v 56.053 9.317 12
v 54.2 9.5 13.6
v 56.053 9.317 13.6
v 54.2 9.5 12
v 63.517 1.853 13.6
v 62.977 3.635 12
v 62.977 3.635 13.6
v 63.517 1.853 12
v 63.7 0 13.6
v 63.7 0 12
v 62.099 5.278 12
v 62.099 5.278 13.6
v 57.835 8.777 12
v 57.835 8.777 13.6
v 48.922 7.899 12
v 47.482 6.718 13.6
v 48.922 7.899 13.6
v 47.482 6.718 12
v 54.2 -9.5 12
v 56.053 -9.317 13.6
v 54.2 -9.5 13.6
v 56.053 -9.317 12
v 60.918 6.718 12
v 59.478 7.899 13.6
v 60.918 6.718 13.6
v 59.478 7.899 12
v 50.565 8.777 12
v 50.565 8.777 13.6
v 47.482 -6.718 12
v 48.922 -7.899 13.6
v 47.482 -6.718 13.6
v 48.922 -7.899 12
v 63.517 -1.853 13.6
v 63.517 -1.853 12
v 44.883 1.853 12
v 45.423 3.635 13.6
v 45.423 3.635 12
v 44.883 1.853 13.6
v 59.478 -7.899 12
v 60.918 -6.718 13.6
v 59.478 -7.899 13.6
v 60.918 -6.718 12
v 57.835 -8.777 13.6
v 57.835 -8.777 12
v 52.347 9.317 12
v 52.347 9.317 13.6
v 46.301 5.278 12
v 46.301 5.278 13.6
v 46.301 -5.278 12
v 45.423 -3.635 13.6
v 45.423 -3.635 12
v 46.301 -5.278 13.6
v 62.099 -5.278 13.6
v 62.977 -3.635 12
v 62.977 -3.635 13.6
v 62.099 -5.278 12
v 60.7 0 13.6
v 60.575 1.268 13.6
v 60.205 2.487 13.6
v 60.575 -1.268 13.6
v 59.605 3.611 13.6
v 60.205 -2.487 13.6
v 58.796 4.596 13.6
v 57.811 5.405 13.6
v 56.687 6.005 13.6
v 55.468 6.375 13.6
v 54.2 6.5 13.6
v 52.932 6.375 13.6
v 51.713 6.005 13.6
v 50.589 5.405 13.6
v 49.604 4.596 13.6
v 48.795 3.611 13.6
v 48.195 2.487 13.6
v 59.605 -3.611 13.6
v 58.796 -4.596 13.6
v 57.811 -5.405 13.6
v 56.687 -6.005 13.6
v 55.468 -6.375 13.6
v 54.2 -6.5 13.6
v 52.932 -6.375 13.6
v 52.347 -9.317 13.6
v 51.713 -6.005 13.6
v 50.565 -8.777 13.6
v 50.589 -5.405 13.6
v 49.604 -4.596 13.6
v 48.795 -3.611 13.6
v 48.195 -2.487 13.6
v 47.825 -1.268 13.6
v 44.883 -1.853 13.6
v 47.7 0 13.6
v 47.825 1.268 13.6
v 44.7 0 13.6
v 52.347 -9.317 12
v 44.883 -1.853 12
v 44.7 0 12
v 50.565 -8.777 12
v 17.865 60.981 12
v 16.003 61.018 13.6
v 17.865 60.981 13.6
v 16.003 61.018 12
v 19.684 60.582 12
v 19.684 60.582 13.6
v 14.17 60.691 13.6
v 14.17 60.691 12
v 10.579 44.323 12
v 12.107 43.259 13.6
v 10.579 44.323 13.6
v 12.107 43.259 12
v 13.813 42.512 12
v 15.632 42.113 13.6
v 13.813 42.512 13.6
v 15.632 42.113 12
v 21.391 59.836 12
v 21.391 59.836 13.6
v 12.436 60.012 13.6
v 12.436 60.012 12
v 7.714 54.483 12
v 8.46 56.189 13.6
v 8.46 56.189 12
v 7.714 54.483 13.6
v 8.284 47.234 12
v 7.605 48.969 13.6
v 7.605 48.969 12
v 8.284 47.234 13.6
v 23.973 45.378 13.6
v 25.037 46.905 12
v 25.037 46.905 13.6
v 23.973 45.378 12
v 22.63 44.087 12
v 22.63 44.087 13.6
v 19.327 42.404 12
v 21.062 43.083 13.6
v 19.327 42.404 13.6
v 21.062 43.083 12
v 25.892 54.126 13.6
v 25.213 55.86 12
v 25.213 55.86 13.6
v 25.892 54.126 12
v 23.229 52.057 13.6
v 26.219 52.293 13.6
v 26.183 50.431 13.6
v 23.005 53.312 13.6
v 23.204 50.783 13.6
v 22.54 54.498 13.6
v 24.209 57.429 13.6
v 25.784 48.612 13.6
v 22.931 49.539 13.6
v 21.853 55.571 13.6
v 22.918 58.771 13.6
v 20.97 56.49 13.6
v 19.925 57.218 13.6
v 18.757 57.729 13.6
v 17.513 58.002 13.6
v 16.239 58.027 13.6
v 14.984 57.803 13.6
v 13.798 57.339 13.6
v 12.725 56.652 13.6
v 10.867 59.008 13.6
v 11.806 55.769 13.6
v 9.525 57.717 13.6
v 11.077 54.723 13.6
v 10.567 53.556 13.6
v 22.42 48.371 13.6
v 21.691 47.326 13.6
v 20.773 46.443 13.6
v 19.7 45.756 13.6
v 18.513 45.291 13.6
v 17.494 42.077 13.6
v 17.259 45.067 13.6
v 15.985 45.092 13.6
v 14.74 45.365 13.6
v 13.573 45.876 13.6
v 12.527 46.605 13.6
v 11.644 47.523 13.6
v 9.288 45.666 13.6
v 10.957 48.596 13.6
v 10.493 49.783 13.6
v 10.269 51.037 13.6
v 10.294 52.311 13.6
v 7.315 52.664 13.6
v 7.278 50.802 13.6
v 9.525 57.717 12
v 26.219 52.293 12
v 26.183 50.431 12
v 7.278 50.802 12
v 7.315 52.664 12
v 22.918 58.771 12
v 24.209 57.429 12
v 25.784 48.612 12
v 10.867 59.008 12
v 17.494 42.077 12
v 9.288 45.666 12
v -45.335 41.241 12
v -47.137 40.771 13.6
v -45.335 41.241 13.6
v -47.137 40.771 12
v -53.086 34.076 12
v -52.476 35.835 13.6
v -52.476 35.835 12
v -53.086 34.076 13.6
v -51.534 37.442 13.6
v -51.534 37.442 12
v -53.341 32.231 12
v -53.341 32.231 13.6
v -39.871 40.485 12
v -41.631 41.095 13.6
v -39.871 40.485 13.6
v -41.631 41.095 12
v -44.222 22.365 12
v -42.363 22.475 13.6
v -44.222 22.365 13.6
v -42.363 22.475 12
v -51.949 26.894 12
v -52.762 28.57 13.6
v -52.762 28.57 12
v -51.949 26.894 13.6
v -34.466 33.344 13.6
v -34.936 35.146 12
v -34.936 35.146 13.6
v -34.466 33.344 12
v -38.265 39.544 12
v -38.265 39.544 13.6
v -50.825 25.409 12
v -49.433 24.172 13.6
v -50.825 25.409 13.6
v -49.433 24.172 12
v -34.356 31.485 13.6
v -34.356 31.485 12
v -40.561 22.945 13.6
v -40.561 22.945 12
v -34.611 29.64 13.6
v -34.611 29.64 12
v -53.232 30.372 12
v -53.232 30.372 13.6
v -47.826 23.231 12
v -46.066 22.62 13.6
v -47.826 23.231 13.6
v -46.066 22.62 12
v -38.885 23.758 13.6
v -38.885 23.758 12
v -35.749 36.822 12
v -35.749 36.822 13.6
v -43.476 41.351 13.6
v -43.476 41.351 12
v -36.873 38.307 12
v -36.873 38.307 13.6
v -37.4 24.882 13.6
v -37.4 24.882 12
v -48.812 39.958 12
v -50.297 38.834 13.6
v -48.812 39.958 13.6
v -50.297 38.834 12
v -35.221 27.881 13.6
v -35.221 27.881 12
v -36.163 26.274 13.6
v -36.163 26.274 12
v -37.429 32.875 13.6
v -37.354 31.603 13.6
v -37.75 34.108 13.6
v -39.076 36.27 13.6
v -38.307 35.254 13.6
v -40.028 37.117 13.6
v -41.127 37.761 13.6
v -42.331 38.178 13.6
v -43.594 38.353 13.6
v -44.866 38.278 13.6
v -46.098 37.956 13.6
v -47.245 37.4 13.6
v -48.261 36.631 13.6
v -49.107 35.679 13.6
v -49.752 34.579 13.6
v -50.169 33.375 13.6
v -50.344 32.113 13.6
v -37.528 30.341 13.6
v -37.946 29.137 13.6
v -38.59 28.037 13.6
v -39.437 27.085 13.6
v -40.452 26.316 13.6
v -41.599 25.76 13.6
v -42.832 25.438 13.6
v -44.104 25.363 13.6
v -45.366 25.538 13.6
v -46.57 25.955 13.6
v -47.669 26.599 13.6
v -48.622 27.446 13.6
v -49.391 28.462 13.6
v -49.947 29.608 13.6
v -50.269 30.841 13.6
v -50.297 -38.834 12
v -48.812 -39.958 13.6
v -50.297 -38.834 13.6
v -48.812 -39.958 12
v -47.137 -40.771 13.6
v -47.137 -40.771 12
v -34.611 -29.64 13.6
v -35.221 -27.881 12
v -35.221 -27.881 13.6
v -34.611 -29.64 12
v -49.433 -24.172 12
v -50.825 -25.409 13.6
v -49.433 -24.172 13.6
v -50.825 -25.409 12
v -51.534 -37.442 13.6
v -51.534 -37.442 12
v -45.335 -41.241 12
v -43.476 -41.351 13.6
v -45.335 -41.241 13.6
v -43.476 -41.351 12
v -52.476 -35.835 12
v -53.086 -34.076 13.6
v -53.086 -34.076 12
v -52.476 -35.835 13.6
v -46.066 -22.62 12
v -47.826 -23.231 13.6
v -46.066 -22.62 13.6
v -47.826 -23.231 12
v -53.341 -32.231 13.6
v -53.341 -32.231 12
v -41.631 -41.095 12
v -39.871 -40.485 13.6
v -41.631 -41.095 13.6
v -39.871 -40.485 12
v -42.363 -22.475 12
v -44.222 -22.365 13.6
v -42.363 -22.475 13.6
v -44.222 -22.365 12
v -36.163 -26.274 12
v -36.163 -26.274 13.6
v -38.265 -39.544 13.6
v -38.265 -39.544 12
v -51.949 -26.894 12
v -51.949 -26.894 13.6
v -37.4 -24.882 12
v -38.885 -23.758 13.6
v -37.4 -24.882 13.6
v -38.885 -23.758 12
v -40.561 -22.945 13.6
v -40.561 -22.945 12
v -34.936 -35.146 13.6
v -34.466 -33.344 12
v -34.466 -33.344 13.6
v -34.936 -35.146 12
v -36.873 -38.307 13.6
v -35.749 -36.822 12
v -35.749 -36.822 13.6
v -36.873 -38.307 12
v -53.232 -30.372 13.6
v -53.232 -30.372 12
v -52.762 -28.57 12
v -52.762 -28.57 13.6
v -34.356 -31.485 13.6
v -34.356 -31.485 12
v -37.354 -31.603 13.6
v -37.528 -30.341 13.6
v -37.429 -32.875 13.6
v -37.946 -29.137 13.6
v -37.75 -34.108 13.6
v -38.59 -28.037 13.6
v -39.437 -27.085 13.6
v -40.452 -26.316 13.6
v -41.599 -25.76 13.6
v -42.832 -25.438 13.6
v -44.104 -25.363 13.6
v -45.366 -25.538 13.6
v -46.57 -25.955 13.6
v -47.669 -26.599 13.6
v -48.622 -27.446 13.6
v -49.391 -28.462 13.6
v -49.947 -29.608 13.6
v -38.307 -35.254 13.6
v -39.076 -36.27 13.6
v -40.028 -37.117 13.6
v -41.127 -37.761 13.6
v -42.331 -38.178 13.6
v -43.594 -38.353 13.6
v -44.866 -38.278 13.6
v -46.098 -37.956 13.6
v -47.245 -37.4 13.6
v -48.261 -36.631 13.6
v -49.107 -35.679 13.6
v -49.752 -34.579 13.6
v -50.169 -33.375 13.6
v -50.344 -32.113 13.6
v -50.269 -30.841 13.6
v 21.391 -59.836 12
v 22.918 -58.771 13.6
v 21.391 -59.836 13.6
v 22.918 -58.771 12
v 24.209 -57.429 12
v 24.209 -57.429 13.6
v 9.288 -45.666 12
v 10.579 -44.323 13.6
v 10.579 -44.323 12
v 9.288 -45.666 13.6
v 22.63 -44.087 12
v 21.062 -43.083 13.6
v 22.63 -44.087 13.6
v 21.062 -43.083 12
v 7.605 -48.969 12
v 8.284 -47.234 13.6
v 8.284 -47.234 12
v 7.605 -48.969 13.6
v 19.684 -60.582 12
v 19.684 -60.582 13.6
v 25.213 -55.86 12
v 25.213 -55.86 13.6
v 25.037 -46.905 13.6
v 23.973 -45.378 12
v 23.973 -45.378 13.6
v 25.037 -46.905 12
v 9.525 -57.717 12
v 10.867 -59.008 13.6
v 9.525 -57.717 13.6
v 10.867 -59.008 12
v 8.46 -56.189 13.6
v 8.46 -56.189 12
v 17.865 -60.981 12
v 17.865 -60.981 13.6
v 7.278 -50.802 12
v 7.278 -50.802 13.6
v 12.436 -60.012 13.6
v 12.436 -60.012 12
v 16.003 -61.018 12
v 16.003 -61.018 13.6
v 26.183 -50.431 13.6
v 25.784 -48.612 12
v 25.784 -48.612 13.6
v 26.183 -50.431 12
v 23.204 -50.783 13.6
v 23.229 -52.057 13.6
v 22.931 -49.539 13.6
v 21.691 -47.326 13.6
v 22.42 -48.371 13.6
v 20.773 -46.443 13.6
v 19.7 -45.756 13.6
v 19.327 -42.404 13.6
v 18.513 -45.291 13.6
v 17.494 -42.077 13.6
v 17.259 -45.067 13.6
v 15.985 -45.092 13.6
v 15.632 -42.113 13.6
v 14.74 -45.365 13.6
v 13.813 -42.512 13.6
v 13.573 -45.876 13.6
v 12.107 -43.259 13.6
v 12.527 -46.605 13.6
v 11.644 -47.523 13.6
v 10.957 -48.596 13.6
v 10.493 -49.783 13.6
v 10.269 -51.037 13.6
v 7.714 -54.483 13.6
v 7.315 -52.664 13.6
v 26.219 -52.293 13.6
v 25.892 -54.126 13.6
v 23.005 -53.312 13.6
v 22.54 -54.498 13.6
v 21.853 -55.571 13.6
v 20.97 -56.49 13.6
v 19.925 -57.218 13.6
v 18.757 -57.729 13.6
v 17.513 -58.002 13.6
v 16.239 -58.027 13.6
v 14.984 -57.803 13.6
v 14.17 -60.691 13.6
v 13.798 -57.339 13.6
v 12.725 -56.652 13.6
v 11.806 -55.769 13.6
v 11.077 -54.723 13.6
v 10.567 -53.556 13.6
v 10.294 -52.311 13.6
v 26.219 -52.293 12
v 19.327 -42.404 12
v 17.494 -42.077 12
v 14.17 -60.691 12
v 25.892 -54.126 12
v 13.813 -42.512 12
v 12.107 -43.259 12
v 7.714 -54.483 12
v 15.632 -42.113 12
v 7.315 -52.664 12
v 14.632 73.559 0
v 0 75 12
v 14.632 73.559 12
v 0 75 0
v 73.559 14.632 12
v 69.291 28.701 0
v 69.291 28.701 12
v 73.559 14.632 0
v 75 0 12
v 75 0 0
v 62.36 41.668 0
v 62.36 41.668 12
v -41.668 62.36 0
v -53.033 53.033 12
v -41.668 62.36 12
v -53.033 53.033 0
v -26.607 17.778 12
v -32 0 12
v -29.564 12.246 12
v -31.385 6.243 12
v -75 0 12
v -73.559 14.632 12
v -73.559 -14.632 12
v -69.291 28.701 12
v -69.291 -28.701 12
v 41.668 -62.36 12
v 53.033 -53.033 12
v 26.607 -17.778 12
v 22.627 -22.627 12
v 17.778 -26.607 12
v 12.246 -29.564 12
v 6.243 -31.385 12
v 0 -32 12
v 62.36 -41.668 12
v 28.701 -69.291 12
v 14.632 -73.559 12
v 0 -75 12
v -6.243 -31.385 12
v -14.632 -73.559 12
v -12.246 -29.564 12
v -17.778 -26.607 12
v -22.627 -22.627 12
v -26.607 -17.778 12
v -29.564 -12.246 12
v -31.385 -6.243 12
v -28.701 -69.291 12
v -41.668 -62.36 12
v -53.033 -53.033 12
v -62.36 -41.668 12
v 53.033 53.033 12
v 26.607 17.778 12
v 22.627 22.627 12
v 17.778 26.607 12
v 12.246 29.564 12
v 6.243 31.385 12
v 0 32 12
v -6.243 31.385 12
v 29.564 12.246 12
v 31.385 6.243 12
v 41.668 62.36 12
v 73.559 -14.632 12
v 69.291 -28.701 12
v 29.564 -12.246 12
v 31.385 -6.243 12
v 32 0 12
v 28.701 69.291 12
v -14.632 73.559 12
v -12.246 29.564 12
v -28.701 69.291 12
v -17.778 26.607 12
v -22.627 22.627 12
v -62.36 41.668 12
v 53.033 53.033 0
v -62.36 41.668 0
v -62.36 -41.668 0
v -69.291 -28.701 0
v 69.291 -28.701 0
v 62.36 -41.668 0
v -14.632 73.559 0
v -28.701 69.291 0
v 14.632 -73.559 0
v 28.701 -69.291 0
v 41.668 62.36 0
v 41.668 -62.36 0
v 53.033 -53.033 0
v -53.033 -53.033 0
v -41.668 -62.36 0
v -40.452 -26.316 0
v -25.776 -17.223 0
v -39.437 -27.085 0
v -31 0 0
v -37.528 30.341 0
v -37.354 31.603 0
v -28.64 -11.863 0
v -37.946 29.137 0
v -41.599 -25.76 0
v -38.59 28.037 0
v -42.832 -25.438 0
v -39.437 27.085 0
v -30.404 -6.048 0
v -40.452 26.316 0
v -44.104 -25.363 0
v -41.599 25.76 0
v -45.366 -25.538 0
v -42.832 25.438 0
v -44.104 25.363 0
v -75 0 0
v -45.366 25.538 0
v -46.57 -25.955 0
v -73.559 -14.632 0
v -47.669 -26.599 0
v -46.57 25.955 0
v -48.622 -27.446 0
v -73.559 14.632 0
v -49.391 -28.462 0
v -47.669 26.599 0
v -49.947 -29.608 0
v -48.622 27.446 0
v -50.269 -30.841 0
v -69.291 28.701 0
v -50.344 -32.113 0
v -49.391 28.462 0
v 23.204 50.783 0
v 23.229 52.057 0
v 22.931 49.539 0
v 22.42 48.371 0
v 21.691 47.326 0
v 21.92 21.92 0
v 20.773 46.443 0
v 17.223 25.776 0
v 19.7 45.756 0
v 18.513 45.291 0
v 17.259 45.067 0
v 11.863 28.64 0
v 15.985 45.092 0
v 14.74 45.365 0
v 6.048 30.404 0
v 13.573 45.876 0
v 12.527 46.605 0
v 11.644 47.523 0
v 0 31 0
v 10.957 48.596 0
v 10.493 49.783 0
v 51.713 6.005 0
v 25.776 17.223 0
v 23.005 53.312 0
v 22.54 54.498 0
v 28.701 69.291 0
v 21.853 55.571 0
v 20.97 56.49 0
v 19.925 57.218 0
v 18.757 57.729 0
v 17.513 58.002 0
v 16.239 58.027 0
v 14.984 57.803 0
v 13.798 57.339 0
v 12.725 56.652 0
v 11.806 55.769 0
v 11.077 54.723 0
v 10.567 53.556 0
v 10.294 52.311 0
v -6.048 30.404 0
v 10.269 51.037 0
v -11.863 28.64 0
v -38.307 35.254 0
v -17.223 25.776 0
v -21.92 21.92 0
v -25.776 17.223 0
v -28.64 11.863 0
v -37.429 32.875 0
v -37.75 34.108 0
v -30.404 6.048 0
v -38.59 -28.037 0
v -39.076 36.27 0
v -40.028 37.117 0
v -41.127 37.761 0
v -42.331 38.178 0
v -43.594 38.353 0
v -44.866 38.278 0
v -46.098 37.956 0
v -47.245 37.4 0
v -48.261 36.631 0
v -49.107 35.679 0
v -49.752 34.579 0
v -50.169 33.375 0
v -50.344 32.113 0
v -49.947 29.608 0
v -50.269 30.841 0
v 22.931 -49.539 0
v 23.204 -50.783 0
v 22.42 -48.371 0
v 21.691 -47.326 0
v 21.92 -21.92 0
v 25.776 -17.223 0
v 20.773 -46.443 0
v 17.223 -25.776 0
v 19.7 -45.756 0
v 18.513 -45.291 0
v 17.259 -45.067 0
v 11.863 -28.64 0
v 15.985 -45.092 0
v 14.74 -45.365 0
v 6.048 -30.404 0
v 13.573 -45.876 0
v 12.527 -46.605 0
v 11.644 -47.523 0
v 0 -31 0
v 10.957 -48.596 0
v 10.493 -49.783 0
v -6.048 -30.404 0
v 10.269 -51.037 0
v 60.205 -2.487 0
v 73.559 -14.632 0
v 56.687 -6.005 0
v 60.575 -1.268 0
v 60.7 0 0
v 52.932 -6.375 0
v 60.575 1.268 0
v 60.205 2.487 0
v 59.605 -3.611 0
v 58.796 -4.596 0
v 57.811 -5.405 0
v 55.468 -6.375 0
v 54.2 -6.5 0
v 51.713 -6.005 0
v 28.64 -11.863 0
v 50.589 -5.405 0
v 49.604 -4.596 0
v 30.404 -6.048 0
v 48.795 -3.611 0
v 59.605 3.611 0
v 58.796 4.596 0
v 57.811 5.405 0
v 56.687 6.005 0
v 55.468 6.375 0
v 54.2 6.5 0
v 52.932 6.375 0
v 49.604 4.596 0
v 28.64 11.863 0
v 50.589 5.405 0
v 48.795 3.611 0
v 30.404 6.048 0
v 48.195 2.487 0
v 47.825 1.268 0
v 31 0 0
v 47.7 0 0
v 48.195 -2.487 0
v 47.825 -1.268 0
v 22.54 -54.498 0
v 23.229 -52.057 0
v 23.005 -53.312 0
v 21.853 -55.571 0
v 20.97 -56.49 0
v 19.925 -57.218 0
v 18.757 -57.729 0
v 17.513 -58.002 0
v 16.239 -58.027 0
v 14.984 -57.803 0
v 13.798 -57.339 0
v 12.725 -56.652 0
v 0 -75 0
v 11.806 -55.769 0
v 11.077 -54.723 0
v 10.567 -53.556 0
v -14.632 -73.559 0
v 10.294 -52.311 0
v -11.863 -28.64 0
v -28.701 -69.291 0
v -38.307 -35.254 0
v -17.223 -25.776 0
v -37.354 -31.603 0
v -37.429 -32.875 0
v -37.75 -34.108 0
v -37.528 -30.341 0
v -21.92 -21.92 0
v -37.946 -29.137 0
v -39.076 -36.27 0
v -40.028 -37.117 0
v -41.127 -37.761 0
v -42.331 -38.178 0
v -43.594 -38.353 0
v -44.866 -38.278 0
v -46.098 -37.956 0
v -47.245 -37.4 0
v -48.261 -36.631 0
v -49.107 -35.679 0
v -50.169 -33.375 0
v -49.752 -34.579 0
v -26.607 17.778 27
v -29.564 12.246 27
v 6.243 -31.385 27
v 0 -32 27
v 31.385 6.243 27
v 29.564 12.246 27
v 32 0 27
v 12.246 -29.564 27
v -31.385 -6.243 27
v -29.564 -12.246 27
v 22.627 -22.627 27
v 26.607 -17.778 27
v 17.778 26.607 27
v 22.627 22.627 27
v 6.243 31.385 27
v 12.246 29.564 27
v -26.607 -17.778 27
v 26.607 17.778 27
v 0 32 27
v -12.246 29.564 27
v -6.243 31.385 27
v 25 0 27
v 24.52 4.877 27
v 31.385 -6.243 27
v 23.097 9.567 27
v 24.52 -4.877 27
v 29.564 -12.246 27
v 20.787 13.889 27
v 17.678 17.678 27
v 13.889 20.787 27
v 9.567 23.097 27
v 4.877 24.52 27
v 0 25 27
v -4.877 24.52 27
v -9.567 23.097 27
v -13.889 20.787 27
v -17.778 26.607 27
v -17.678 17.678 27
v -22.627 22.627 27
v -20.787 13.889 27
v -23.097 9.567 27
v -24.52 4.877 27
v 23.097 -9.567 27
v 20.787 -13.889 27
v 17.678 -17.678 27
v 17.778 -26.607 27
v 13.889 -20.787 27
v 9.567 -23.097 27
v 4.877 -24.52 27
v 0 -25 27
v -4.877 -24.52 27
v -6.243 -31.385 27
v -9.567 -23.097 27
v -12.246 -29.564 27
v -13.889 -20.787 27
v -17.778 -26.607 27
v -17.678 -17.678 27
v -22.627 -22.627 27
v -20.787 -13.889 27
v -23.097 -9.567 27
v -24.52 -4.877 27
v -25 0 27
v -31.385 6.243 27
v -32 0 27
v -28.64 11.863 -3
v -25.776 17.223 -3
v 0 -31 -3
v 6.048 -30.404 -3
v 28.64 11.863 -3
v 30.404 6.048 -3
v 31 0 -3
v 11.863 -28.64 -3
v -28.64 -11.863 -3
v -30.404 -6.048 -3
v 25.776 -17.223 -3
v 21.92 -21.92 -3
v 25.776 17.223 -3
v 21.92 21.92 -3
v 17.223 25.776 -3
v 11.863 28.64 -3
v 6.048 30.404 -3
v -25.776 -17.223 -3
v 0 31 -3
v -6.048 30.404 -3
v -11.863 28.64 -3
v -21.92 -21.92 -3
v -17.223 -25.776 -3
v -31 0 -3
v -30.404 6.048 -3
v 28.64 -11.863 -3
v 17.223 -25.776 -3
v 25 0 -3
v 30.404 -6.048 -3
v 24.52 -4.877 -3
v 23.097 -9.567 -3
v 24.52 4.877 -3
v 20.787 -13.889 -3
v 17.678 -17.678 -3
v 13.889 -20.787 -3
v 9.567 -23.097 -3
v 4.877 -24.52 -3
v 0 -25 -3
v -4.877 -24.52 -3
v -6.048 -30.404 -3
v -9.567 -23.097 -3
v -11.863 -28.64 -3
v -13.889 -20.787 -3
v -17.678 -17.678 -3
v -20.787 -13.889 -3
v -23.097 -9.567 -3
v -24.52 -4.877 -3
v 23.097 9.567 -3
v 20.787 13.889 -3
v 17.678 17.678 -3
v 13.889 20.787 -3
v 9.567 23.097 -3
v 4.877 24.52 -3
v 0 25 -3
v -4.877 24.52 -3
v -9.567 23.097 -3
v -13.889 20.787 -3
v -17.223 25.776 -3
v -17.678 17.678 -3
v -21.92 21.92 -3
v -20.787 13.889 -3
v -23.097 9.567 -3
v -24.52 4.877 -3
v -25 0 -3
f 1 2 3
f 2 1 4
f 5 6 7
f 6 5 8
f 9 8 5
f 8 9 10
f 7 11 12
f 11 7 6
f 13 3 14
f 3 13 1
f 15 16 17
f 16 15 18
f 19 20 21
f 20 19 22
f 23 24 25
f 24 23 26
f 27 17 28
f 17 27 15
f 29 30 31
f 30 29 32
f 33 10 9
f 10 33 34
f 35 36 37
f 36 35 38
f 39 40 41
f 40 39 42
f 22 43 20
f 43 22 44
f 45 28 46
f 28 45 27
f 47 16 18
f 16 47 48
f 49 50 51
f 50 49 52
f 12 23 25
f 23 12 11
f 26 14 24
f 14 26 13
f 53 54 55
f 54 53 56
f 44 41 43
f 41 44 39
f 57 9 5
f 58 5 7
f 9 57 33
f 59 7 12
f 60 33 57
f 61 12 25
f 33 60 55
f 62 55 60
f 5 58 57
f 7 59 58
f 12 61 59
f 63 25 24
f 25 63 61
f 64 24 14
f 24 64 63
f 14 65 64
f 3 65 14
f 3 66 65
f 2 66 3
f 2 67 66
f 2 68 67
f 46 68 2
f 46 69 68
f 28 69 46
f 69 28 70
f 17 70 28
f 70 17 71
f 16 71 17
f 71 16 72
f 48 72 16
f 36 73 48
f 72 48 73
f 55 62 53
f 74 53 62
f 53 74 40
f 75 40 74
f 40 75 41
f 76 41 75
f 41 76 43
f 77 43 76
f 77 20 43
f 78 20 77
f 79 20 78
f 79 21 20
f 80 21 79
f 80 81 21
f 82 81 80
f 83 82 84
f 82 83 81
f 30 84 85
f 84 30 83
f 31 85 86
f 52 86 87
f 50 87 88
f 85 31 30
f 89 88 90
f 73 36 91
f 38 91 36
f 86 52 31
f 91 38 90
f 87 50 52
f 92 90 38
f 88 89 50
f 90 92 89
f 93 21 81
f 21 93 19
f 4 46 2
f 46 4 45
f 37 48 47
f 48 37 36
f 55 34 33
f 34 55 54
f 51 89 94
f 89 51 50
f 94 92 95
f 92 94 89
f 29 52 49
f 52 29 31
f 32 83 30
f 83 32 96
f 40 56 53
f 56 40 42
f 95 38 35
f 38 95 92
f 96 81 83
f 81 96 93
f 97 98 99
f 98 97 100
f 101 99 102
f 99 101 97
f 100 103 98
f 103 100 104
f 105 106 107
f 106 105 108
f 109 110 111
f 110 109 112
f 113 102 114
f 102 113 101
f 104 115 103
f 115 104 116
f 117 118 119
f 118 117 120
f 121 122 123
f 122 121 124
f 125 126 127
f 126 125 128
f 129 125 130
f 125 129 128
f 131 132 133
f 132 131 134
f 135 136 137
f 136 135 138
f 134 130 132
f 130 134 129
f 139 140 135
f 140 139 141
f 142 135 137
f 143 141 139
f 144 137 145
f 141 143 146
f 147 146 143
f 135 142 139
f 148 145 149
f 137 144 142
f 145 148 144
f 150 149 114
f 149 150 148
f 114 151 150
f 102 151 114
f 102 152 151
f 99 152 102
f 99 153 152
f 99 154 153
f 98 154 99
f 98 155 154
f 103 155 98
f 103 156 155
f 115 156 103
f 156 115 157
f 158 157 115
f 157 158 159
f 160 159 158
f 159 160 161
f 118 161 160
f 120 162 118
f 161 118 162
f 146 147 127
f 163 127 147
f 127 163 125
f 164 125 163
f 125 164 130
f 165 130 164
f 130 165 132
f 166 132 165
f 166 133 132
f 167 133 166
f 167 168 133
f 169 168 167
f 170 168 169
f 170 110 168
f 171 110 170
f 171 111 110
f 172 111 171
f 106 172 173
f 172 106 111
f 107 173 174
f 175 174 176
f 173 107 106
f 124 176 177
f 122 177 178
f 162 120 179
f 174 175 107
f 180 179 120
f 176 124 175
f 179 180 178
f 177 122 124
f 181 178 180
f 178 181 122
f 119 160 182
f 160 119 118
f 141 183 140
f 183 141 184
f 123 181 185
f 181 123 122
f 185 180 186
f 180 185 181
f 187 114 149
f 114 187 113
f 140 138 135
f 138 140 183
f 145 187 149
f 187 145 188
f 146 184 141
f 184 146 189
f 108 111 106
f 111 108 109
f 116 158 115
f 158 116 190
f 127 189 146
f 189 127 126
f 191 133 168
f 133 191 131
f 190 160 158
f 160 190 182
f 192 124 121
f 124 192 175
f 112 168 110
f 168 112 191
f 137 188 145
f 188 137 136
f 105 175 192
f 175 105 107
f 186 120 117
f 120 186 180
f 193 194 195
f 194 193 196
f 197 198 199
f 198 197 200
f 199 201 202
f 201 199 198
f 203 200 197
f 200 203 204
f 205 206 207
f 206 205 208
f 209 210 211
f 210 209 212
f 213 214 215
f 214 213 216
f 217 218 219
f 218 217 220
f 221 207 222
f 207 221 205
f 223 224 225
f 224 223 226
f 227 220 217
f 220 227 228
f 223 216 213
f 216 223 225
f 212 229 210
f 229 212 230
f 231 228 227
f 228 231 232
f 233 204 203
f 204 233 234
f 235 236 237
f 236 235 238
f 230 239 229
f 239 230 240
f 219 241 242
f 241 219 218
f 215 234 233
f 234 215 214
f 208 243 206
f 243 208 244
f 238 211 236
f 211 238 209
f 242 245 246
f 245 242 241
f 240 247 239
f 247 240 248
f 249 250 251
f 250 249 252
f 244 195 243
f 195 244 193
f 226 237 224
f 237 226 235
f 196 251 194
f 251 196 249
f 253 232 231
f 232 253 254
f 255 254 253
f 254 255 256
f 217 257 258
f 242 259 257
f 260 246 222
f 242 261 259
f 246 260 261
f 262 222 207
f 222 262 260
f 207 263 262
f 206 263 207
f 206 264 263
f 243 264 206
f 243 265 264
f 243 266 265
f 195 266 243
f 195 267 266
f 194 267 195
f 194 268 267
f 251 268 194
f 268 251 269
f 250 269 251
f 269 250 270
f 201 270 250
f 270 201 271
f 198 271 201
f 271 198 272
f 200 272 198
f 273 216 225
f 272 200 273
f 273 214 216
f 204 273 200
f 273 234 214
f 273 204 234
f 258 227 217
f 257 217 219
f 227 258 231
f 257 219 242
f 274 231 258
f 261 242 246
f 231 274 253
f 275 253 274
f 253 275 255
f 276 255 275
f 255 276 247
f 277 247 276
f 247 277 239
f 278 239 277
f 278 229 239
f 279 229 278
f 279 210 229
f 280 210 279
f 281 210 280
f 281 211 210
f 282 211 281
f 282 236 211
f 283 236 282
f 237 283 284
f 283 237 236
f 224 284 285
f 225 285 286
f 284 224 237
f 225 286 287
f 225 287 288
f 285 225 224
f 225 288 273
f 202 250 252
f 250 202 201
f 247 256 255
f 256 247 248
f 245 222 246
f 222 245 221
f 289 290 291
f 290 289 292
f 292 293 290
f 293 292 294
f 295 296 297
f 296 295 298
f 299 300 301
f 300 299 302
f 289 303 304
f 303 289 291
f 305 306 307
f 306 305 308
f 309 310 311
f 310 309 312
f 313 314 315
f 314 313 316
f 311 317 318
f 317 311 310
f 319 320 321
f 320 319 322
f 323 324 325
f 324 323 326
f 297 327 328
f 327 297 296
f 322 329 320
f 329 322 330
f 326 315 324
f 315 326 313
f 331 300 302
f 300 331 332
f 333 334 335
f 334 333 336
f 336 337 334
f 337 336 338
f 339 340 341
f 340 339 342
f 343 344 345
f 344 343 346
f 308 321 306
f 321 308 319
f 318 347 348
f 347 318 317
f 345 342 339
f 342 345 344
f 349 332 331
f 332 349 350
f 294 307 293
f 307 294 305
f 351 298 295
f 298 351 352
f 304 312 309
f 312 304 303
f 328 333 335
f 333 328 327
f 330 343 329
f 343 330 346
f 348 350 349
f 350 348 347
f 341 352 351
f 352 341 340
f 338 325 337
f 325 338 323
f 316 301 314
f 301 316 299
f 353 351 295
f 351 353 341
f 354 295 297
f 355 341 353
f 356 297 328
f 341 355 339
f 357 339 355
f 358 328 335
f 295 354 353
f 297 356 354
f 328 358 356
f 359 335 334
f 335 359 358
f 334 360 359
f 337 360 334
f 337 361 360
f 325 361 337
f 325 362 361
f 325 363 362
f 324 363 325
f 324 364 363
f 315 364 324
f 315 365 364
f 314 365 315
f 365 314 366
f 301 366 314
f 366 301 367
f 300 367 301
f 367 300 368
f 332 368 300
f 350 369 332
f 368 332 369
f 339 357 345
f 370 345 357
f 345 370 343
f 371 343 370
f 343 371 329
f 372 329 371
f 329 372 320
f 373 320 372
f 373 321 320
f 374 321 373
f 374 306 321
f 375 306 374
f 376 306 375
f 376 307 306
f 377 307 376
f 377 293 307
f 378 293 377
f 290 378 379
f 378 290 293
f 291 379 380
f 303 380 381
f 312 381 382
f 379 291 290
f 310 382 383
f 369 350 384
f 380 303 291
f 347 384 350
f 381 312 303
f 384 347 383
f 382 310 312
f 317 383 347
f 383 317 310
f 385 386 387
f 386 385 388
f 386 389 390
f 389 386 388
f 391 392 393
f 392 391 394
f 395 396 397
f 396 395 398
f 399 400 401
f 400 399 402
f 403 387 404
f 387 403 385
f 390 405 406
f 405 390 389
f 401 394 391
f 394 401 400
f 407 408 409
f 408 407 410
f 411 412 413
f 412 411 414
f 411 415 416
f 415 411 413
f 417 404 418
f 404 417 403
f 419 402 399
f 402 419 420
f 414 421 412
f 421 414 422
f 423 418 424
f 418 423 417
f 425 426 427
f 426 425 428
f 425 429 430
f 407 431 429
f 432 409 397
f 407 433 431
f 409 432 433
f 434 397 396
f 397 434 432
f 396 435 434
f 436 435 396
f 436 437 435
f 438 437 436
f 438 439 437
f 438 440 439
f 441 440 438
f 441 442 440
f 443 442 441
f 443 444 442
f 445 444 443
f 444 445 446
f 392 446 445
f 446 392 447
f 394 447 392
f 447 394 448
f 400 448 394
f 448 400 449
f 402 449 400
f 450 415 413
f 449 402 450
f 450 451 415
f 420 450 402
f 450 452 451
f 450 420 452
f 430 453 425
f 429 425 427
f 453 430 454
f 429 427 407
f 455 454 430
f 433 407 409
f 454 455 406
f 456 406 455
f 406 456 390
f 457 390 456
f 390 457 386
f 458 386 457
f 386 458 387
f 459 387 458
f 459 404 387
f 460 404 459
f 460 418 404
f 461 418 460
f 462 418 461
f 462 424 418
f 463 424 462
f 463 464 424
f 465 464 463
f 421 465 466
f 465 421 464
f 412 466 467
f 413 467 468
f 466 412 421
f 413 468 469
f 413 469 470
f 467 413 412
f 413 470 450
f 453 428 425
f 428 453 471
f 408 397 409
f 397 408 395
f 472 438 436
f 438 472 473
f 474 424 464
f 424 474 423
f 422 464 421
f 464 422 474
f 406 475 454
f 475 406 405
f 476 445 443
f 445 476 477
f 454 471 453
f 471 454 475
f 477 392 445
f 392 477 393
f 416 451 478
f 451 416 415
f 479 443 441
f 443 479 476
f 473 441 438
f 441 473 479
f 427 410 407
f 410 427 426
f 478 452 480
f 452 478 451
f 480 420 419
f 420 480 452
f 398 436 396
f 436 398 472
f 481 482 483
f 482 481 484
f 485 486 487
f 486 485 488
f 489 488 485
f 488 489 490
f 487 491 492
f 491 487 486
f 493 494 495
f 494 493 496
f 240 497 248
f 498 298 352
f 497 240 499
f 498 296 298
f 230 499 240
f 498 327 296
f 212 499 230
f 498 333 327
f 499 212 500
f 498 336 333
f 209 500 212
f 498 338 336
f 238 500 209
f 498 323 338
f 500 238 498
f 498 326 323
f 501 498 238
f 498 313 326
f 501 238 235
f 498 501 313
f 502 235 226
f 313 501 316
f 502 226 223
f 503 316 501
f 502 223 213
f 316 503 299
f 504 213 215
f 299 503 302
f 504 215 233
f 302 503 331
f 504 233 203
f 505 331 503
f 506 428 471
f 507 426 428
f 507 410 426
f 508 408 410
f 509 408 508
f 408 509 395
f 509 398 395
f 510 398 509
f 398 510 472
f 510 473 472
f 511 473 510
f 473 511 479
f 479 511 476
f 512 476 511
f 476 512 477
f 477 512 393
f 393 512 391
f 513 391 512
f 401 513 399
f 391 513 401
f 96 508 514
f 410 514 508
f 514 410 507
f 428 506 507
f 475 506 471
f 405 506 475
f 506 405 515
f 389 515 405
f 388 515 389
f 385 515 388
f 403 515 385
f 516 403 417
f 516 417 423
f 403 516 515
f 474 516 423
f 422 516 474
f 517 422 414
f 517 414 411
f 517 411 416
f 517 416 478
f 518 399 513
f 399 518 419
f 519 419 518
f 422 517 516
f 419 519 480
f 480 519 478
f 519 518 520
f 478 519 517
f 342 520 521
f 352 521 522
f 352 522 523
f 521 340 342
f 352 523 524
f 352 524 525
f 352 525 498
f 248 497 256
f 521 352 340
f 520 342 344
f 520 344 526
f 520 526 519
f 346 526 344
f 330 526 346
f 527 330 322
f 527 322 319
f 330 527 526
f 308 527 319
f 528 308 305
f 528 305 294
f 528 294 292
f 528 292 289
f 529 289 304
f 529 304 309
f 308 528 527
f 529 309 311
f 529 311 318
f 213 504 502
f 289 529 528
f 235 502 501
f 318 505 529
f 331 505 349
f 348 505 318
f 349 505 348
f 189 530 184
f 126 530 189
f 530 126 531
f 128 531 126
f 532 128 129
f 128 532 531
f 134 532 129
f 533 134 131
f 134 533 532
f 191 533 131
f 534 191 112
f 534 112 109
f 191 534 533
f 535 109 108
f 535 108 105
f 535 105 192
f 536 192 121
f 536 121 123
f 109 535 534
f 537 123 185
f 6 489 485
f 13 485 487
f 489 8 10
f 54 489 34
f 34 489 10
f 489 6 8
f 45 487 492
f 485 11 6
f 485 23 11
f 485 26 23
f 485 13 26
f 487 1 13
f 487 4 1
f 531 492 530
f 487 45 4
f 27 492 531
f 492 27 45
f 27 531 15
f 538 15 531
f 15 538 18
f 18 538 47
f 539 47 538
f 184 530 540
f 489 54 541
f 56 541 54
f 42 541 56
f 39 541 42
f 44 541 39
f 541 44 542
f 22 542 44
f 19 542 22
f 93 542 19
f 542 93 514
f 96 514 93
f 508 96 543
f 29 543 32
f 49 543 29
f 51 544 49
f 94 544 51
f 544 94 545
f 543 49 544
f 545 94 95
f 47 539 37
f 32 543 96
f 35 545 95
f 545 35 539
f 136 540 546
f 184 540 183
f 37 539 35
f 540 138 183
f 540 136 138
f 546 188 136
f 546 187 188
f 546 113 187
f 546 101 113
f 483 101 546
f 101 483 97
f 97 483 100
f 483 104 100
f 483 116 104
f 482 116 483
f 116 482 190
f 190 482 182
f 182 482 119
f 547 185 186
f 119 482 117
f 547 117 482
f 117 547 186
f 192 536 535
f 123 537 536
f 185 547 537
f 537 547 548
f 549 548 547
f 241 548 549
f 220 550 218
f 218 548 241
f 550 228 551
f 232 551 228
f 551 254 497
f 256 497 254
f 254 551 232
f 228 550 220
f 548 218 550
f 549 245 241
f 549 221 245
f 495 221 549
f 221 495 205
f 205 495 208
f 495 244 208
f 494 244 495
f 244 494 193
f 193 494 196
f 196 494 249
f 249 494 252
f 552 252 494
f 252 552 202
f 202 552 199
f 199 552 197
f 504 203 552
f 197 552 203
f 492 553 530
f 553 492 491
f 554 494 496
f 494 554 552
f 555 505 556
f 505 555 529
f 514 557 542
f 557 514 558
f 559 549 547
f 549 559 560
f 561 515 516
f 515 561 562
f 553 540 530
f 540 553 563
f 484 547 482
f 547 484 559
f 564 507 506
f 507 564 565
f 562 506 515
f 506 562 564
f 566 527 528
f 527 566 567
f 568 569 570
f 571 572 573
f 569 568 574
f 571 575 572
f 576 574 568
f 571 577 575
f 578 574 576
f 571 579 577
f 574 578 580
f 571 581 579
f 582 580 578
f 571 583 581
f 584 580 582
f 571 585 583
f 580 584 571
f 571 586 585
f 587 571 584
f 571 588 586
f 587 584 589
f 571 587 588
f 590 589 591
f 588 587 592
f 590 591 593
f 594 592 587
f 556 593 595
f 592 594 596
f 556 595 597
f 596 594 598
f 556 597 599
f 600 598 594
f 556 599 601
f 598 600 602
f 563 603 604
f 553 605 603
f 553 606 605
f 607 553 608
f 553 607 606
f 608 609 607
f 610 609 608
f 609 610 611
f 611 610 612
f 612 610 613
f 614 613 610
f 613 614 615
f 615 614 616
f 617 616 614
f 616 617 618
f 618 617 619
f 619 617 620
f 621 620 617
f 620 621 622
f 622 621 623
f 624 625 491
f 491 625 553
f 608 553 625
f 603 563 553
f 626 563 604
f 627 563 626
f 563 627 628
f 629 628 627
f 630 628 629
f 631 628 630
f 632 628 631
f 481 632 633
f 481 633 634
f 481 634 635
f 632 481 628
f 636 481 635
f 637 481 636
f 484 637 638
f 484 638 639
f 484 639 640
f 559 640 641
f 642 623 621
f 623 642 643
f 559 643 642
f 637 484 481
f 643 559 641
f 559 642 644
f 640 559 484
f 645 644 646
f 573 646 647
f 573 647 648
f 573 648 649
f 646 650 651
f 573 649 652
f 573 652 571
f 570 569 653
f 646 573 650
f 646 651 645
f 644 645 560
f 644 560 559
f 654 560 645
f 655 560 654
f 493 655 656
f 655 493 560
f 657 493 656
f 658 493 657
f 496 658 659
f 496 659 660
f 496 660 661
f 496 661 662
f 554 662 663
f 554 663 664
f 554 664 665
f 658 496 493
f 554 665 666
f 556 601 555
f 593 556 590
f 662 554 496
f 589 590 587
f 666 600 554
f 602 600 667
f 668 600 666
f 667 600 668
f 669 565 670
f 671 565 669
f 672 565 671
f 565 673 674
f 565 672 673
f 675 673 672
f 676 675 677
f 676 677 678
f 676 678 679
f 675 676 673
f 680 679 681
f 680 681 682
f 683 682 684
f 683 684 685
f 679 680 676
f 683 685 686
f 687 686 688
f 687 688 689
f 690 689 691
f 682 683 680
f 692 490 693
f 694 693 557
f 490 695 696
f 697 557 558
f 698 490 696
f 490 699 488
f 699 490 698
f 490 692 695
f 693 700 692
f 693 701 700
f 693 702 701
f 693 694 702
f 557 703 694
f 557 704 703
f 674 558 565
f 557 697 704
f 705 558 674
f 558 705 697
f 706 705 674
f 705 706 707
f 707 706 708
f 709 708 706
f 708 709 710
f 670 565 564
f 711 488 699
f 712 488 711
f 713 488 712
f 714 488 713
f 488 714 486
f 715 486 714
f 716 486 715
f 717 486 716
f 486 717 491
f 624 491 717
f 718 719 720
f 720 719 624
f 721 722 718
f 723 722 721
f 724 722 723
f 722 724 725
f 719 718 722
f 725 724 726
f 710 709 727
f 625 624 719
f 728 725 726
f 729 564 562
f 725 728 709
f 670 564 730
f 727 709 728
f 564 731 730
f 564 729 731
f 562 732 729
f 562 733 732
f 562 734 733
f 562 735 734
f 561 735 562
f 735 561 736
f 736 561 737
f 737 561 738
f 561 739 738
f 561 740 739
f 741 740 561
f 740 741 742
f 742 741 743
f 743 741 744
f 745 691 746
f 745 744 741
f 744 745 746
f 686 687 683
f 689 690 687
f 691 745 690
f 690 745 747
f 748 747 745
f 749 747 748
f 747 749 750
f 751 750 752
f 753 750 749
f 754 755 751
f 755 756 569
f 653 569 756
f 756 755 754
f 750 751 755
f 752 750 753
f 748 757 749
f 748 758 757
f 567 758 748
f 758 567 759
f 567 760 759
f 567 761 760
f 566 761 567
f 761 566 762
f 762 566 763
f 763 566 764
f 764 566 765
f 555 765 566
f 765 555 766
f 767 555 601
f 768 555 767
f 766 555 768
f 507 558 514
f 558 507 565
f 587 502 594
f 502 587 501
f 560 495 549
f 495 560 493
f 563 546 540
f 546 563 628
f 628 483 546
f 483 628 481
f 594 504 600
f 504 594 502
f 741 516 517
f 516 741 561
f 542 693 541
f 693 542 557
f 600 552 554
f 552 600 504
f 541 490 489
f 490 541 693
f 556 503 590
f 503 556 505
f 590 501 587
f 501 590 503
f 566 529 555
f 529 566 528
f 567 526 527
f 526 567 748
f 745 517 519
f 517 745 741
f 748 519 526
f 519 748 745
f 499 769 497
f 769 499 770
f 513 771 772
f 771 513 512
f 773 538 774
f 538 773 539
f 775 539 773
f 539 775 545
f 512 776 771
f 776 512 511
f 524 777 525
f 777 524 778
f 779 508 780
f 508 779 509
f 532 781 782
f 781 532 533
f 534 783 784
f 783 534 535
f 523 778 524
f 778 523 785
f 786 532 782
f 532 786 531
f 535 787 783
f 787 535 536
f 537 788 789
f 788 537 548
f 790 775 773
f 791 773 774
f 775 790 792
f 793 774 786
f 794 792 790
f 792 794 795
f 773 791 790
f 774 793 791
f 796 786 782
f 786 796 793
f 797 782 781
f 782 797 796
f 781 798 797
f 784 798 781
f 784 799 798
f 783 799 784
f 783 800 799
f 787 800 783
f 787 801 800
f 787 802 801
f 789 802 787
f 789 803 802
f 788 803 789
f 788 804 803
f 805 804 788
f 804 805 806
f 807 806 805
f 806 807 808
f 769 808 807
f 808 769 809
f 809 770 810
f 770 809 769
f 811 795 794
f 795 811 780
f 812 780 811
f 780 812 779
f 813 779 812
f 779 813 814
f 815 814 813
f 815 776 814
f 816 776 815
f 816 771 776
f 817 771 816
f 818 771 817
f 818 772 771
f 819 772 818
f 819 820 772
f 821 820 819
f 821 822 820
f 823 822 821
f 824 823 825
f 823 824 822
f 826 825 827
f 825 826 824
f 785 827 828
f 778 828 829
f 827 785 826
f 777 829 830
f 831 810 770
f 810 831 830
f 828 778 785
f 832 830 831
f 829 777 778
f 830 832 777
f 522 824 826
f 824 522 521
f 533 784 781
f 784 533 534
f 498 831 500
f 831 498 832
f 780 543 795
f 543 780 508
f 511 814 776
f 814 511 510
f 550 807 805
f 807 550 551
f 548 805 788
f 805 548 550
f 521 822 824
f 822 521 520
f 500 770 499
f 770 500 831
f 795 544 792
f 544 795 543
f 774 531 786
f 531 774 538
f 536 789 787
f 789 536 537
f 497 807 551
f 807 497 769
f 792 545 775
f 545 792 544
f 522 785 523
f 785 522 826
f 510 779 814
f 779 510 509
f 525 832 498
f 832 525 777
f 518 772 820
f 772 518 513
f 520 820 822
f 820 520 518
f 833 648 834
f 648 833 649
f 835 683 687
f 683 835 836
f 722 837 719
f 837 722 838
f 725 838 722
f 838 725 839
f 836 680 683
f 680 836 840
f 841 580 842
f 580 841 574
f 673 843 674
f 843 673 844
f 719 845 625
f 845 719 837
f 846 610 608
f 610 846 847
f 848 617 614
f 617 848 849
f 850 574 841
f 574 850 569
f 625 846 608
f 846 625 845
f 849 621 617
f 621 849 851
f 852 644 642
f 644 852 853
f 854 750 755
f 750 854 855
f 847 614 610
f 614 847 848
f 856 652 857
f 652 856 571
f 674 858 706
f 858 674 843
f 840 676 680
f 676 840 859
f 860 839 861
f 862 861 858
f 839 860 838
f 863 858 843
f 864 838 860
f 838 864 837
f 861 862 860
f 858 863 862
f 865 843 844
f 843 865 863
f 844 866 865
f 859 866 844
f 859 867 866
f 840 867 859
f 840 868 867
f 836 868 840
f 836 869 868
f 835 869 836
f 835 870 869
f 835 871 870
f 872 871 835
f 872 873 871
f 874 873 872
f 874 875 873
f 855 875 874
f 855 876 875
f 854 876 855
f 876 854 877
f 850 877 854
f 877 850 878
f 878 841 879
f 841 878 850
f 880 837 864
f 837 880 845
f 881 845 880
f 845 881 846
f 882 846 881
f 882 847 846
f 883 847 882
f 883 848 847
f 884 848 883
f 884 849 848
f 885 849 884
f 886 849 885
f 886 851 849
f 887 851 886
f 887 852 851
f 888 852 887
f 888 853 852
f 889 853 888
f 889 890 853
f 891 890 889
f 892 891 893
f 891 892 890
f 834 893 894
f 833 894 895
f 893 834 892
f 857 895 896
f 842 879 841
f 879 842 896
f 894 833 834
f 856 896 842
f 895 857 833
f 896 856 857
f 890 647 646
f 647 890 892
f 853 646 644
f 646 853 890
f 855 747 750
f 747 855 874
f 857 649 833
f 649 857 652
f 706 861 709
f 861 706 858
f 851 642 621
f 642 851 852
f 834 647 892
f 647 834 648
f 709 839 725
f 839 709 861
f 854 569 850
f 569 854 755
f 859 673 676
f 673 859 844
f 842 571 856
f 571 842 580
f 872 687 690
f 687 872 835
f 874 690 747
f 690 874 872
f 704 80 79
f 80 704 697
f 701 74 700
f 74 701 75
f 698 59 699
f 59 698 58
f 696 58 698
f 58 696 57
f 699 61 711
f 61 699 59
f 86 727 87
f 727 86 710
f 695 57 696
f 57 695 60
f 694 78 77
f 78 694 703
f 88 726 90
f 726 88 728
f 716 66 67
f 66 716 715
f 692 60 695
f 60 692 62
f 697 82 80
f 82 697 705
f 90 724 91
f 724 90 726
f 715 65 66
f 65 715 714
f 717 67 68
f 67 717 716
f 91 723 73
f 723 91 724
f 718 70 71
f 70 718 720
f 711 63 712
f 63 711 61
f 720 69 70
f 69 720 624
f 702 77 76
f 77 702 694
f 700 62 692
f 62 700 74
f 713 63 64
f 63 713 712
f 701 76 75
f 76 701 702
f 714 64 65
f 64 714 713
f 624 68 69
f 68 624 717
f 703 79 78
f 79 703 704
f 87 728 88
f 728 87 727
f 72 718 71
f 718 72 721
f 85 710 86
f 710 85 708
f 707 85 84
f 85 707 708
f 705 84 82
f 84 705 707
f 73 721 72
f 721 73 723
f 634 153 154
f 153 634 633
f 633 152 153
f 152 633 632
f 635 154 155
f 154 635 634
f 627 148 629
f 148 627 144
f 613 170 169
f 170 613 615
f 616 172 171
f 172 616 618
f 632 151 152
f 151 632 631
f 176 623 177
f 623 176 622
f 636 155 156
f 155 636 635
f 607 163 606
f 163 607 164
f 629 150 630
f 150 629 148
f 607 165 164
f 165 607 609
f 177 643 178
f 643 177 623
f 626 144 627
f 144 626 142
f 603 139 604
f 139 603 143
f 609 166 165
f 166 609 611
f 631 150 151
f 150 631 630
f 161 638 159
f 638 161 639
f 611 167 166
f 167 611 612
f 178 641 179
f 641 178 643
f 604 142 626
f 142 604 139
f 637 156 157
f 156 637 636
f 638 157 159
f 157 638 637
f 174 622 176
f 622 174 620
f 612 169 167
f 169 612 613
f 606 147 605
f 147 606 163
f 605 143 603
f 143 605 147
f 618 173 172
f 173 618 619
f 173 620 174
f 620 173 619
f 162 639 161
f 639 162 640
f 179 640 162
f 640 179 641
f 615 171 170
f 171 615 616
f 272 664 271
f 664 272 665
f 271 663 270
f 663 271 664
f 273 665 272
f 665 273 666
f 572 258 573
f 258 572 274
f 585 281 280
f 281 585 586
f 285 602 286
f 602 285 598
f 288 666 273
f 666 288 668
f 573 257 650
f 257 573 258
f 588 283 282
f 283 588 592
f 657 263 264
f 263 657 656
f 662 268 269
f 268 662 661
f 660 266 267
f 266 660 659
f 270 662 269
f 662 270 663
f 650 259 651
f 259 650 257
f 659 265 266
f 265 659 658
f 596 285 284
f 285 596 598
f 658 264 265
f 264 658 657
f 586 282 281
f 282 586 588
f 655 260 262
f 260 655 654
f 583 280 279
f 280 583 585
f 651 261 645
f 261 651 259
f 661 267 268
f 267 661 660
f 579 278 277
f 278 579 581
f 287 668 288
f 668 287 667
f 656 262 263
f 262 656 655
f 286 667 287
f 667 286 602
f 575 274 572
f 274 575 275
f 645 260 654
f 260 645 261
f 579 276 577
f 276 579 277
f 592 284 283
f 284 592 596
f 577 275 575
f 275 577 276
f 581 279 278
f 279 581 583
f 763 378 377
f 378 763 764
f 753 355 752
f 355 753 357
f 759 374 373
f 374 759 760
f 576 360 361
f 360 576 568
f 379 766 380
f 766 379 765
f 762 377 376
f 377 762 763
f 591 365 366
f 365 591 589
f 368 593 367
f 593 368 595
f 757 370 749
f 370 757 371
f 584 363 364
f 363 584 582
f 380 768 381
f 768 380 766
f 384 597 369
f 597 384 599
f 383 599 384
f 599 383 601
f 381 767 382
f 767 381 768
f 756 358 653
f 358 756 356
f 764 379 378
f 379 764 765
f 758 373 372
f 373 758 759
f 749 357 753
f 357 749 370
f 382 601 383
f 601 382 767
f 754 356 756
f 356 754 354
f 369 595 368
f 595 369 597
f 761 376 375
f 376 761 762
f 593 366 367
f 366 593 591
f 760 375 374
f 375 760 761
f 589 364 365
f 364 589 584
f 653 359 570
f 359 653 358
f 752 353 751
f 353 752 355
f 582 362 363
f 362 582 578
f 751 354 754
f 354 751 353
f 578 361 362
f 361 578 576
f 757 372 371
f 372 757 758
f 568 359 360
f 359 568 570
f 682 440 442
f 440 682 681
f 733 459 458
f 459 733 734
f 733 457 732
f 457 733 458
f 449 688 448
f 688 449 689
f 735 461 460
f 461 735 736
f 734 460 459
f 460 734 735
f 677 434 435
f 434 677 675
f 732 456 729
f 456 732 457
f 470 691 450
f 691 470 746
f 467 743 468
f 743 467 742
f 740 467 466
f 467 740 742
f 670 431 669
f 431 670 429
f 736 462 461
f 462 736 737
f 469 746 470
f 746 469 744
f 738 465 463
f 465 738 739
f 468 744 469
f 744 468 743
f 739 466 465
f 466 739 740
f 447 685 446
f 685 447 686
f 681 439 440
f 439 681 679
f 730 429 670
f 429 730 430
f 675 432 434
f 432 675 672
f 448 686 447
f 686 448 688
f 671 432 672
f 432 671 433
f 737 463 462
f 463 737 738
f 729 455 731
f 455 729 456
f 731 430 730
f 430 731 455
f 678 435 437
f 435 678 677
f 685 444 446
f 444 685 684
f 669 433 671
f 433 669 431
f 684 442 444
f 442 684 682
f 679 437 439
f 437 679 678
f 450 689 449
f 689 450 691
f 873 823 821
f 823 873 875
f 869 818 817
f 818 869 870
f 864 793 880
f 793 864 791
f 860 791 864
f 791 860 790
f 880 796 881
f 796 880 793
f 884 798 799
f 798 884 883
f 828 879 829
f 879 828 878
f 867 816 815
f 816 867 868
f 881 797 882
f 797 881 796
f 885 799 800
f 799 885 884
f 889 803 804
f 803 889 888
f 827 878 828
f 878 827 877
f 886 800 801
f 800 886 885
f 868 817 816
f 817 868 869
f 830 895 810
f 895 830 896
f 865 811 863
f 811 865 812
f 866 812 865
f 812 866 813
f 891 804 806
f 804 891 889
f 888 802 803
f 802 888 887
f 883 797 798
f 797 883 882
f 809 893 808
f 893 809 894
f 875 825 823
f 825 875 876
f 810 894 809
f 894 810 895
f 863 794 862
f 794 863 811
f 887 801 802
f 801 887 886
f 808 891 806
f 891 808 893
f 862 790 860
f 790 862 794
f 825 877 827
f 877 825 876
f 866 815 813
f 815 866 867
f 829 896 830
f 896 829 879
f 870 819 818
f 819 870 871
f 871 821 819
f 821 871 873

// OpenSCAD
$fn = 32;

// ----------------------------------------------------------------------
// Bolt-circle flange: 150 mm outside, 5 bolt holes, bore 50 mm
// ----------------------------------------------------------------------

// --- parameters (mm) ---
flange_d = 150;           // flange outside diameter
flange_t = 12;            // flange thickness
bolts = 5;                // number of bolt holes
bolt_d = 13;              // bolt clearance
bolt_r = 54.2;            // bolt circle radius
bore_d = 50;              // centre bore
hub_d = 64;               // raised hub diameter
hub_h = 15;               // raised hub height
spigot_d = 62;            // spigot diameter
spigot_h = 4;             // spigot height below the flange
sink = 1;                 // overlap into the flange
spot_d = 19;              // spot faced bosses
spot_h = 1.6;             // spot face height

module body() {
  cylinder(h = flange_t, d = flange_d);
  /* raised hub, sunk 1 mm into the flange */
  translate([0, 0, flange_t - 1]) cylinder(h = hub_h + 1, d = hub_d);
  /* spigot on the back face, sunk into the flange */
  translate([0, 0, -spigot_h + sink]) cylinder(h = spigot_h, d = spigot_d);
  /* spot faced pads under the bolt heads */
  for (i = [0 : bolts - 1]) rotate([0, 0, i * 360 / bolts]) translate([bolt_r, 0, flange_t - 1]) cylinder(h = spot_h + 1, d = spot_d);
}

difference() {
  body();
  /* bolt circle */
  for (i = [0 : bolts - 1]) rotate([0, 0, i * 360 / bolts]) translate([bolt_r, 0, -spigot_h - 1]) cylinder(h = flange_t + hub_h + spigot_h + 3, d = bolt_d);
  translate([0, 0, -spigot_h - 1]) cylinder(h = flange_t + hub_h + spigot_h + 3, d = bore_d);
}
